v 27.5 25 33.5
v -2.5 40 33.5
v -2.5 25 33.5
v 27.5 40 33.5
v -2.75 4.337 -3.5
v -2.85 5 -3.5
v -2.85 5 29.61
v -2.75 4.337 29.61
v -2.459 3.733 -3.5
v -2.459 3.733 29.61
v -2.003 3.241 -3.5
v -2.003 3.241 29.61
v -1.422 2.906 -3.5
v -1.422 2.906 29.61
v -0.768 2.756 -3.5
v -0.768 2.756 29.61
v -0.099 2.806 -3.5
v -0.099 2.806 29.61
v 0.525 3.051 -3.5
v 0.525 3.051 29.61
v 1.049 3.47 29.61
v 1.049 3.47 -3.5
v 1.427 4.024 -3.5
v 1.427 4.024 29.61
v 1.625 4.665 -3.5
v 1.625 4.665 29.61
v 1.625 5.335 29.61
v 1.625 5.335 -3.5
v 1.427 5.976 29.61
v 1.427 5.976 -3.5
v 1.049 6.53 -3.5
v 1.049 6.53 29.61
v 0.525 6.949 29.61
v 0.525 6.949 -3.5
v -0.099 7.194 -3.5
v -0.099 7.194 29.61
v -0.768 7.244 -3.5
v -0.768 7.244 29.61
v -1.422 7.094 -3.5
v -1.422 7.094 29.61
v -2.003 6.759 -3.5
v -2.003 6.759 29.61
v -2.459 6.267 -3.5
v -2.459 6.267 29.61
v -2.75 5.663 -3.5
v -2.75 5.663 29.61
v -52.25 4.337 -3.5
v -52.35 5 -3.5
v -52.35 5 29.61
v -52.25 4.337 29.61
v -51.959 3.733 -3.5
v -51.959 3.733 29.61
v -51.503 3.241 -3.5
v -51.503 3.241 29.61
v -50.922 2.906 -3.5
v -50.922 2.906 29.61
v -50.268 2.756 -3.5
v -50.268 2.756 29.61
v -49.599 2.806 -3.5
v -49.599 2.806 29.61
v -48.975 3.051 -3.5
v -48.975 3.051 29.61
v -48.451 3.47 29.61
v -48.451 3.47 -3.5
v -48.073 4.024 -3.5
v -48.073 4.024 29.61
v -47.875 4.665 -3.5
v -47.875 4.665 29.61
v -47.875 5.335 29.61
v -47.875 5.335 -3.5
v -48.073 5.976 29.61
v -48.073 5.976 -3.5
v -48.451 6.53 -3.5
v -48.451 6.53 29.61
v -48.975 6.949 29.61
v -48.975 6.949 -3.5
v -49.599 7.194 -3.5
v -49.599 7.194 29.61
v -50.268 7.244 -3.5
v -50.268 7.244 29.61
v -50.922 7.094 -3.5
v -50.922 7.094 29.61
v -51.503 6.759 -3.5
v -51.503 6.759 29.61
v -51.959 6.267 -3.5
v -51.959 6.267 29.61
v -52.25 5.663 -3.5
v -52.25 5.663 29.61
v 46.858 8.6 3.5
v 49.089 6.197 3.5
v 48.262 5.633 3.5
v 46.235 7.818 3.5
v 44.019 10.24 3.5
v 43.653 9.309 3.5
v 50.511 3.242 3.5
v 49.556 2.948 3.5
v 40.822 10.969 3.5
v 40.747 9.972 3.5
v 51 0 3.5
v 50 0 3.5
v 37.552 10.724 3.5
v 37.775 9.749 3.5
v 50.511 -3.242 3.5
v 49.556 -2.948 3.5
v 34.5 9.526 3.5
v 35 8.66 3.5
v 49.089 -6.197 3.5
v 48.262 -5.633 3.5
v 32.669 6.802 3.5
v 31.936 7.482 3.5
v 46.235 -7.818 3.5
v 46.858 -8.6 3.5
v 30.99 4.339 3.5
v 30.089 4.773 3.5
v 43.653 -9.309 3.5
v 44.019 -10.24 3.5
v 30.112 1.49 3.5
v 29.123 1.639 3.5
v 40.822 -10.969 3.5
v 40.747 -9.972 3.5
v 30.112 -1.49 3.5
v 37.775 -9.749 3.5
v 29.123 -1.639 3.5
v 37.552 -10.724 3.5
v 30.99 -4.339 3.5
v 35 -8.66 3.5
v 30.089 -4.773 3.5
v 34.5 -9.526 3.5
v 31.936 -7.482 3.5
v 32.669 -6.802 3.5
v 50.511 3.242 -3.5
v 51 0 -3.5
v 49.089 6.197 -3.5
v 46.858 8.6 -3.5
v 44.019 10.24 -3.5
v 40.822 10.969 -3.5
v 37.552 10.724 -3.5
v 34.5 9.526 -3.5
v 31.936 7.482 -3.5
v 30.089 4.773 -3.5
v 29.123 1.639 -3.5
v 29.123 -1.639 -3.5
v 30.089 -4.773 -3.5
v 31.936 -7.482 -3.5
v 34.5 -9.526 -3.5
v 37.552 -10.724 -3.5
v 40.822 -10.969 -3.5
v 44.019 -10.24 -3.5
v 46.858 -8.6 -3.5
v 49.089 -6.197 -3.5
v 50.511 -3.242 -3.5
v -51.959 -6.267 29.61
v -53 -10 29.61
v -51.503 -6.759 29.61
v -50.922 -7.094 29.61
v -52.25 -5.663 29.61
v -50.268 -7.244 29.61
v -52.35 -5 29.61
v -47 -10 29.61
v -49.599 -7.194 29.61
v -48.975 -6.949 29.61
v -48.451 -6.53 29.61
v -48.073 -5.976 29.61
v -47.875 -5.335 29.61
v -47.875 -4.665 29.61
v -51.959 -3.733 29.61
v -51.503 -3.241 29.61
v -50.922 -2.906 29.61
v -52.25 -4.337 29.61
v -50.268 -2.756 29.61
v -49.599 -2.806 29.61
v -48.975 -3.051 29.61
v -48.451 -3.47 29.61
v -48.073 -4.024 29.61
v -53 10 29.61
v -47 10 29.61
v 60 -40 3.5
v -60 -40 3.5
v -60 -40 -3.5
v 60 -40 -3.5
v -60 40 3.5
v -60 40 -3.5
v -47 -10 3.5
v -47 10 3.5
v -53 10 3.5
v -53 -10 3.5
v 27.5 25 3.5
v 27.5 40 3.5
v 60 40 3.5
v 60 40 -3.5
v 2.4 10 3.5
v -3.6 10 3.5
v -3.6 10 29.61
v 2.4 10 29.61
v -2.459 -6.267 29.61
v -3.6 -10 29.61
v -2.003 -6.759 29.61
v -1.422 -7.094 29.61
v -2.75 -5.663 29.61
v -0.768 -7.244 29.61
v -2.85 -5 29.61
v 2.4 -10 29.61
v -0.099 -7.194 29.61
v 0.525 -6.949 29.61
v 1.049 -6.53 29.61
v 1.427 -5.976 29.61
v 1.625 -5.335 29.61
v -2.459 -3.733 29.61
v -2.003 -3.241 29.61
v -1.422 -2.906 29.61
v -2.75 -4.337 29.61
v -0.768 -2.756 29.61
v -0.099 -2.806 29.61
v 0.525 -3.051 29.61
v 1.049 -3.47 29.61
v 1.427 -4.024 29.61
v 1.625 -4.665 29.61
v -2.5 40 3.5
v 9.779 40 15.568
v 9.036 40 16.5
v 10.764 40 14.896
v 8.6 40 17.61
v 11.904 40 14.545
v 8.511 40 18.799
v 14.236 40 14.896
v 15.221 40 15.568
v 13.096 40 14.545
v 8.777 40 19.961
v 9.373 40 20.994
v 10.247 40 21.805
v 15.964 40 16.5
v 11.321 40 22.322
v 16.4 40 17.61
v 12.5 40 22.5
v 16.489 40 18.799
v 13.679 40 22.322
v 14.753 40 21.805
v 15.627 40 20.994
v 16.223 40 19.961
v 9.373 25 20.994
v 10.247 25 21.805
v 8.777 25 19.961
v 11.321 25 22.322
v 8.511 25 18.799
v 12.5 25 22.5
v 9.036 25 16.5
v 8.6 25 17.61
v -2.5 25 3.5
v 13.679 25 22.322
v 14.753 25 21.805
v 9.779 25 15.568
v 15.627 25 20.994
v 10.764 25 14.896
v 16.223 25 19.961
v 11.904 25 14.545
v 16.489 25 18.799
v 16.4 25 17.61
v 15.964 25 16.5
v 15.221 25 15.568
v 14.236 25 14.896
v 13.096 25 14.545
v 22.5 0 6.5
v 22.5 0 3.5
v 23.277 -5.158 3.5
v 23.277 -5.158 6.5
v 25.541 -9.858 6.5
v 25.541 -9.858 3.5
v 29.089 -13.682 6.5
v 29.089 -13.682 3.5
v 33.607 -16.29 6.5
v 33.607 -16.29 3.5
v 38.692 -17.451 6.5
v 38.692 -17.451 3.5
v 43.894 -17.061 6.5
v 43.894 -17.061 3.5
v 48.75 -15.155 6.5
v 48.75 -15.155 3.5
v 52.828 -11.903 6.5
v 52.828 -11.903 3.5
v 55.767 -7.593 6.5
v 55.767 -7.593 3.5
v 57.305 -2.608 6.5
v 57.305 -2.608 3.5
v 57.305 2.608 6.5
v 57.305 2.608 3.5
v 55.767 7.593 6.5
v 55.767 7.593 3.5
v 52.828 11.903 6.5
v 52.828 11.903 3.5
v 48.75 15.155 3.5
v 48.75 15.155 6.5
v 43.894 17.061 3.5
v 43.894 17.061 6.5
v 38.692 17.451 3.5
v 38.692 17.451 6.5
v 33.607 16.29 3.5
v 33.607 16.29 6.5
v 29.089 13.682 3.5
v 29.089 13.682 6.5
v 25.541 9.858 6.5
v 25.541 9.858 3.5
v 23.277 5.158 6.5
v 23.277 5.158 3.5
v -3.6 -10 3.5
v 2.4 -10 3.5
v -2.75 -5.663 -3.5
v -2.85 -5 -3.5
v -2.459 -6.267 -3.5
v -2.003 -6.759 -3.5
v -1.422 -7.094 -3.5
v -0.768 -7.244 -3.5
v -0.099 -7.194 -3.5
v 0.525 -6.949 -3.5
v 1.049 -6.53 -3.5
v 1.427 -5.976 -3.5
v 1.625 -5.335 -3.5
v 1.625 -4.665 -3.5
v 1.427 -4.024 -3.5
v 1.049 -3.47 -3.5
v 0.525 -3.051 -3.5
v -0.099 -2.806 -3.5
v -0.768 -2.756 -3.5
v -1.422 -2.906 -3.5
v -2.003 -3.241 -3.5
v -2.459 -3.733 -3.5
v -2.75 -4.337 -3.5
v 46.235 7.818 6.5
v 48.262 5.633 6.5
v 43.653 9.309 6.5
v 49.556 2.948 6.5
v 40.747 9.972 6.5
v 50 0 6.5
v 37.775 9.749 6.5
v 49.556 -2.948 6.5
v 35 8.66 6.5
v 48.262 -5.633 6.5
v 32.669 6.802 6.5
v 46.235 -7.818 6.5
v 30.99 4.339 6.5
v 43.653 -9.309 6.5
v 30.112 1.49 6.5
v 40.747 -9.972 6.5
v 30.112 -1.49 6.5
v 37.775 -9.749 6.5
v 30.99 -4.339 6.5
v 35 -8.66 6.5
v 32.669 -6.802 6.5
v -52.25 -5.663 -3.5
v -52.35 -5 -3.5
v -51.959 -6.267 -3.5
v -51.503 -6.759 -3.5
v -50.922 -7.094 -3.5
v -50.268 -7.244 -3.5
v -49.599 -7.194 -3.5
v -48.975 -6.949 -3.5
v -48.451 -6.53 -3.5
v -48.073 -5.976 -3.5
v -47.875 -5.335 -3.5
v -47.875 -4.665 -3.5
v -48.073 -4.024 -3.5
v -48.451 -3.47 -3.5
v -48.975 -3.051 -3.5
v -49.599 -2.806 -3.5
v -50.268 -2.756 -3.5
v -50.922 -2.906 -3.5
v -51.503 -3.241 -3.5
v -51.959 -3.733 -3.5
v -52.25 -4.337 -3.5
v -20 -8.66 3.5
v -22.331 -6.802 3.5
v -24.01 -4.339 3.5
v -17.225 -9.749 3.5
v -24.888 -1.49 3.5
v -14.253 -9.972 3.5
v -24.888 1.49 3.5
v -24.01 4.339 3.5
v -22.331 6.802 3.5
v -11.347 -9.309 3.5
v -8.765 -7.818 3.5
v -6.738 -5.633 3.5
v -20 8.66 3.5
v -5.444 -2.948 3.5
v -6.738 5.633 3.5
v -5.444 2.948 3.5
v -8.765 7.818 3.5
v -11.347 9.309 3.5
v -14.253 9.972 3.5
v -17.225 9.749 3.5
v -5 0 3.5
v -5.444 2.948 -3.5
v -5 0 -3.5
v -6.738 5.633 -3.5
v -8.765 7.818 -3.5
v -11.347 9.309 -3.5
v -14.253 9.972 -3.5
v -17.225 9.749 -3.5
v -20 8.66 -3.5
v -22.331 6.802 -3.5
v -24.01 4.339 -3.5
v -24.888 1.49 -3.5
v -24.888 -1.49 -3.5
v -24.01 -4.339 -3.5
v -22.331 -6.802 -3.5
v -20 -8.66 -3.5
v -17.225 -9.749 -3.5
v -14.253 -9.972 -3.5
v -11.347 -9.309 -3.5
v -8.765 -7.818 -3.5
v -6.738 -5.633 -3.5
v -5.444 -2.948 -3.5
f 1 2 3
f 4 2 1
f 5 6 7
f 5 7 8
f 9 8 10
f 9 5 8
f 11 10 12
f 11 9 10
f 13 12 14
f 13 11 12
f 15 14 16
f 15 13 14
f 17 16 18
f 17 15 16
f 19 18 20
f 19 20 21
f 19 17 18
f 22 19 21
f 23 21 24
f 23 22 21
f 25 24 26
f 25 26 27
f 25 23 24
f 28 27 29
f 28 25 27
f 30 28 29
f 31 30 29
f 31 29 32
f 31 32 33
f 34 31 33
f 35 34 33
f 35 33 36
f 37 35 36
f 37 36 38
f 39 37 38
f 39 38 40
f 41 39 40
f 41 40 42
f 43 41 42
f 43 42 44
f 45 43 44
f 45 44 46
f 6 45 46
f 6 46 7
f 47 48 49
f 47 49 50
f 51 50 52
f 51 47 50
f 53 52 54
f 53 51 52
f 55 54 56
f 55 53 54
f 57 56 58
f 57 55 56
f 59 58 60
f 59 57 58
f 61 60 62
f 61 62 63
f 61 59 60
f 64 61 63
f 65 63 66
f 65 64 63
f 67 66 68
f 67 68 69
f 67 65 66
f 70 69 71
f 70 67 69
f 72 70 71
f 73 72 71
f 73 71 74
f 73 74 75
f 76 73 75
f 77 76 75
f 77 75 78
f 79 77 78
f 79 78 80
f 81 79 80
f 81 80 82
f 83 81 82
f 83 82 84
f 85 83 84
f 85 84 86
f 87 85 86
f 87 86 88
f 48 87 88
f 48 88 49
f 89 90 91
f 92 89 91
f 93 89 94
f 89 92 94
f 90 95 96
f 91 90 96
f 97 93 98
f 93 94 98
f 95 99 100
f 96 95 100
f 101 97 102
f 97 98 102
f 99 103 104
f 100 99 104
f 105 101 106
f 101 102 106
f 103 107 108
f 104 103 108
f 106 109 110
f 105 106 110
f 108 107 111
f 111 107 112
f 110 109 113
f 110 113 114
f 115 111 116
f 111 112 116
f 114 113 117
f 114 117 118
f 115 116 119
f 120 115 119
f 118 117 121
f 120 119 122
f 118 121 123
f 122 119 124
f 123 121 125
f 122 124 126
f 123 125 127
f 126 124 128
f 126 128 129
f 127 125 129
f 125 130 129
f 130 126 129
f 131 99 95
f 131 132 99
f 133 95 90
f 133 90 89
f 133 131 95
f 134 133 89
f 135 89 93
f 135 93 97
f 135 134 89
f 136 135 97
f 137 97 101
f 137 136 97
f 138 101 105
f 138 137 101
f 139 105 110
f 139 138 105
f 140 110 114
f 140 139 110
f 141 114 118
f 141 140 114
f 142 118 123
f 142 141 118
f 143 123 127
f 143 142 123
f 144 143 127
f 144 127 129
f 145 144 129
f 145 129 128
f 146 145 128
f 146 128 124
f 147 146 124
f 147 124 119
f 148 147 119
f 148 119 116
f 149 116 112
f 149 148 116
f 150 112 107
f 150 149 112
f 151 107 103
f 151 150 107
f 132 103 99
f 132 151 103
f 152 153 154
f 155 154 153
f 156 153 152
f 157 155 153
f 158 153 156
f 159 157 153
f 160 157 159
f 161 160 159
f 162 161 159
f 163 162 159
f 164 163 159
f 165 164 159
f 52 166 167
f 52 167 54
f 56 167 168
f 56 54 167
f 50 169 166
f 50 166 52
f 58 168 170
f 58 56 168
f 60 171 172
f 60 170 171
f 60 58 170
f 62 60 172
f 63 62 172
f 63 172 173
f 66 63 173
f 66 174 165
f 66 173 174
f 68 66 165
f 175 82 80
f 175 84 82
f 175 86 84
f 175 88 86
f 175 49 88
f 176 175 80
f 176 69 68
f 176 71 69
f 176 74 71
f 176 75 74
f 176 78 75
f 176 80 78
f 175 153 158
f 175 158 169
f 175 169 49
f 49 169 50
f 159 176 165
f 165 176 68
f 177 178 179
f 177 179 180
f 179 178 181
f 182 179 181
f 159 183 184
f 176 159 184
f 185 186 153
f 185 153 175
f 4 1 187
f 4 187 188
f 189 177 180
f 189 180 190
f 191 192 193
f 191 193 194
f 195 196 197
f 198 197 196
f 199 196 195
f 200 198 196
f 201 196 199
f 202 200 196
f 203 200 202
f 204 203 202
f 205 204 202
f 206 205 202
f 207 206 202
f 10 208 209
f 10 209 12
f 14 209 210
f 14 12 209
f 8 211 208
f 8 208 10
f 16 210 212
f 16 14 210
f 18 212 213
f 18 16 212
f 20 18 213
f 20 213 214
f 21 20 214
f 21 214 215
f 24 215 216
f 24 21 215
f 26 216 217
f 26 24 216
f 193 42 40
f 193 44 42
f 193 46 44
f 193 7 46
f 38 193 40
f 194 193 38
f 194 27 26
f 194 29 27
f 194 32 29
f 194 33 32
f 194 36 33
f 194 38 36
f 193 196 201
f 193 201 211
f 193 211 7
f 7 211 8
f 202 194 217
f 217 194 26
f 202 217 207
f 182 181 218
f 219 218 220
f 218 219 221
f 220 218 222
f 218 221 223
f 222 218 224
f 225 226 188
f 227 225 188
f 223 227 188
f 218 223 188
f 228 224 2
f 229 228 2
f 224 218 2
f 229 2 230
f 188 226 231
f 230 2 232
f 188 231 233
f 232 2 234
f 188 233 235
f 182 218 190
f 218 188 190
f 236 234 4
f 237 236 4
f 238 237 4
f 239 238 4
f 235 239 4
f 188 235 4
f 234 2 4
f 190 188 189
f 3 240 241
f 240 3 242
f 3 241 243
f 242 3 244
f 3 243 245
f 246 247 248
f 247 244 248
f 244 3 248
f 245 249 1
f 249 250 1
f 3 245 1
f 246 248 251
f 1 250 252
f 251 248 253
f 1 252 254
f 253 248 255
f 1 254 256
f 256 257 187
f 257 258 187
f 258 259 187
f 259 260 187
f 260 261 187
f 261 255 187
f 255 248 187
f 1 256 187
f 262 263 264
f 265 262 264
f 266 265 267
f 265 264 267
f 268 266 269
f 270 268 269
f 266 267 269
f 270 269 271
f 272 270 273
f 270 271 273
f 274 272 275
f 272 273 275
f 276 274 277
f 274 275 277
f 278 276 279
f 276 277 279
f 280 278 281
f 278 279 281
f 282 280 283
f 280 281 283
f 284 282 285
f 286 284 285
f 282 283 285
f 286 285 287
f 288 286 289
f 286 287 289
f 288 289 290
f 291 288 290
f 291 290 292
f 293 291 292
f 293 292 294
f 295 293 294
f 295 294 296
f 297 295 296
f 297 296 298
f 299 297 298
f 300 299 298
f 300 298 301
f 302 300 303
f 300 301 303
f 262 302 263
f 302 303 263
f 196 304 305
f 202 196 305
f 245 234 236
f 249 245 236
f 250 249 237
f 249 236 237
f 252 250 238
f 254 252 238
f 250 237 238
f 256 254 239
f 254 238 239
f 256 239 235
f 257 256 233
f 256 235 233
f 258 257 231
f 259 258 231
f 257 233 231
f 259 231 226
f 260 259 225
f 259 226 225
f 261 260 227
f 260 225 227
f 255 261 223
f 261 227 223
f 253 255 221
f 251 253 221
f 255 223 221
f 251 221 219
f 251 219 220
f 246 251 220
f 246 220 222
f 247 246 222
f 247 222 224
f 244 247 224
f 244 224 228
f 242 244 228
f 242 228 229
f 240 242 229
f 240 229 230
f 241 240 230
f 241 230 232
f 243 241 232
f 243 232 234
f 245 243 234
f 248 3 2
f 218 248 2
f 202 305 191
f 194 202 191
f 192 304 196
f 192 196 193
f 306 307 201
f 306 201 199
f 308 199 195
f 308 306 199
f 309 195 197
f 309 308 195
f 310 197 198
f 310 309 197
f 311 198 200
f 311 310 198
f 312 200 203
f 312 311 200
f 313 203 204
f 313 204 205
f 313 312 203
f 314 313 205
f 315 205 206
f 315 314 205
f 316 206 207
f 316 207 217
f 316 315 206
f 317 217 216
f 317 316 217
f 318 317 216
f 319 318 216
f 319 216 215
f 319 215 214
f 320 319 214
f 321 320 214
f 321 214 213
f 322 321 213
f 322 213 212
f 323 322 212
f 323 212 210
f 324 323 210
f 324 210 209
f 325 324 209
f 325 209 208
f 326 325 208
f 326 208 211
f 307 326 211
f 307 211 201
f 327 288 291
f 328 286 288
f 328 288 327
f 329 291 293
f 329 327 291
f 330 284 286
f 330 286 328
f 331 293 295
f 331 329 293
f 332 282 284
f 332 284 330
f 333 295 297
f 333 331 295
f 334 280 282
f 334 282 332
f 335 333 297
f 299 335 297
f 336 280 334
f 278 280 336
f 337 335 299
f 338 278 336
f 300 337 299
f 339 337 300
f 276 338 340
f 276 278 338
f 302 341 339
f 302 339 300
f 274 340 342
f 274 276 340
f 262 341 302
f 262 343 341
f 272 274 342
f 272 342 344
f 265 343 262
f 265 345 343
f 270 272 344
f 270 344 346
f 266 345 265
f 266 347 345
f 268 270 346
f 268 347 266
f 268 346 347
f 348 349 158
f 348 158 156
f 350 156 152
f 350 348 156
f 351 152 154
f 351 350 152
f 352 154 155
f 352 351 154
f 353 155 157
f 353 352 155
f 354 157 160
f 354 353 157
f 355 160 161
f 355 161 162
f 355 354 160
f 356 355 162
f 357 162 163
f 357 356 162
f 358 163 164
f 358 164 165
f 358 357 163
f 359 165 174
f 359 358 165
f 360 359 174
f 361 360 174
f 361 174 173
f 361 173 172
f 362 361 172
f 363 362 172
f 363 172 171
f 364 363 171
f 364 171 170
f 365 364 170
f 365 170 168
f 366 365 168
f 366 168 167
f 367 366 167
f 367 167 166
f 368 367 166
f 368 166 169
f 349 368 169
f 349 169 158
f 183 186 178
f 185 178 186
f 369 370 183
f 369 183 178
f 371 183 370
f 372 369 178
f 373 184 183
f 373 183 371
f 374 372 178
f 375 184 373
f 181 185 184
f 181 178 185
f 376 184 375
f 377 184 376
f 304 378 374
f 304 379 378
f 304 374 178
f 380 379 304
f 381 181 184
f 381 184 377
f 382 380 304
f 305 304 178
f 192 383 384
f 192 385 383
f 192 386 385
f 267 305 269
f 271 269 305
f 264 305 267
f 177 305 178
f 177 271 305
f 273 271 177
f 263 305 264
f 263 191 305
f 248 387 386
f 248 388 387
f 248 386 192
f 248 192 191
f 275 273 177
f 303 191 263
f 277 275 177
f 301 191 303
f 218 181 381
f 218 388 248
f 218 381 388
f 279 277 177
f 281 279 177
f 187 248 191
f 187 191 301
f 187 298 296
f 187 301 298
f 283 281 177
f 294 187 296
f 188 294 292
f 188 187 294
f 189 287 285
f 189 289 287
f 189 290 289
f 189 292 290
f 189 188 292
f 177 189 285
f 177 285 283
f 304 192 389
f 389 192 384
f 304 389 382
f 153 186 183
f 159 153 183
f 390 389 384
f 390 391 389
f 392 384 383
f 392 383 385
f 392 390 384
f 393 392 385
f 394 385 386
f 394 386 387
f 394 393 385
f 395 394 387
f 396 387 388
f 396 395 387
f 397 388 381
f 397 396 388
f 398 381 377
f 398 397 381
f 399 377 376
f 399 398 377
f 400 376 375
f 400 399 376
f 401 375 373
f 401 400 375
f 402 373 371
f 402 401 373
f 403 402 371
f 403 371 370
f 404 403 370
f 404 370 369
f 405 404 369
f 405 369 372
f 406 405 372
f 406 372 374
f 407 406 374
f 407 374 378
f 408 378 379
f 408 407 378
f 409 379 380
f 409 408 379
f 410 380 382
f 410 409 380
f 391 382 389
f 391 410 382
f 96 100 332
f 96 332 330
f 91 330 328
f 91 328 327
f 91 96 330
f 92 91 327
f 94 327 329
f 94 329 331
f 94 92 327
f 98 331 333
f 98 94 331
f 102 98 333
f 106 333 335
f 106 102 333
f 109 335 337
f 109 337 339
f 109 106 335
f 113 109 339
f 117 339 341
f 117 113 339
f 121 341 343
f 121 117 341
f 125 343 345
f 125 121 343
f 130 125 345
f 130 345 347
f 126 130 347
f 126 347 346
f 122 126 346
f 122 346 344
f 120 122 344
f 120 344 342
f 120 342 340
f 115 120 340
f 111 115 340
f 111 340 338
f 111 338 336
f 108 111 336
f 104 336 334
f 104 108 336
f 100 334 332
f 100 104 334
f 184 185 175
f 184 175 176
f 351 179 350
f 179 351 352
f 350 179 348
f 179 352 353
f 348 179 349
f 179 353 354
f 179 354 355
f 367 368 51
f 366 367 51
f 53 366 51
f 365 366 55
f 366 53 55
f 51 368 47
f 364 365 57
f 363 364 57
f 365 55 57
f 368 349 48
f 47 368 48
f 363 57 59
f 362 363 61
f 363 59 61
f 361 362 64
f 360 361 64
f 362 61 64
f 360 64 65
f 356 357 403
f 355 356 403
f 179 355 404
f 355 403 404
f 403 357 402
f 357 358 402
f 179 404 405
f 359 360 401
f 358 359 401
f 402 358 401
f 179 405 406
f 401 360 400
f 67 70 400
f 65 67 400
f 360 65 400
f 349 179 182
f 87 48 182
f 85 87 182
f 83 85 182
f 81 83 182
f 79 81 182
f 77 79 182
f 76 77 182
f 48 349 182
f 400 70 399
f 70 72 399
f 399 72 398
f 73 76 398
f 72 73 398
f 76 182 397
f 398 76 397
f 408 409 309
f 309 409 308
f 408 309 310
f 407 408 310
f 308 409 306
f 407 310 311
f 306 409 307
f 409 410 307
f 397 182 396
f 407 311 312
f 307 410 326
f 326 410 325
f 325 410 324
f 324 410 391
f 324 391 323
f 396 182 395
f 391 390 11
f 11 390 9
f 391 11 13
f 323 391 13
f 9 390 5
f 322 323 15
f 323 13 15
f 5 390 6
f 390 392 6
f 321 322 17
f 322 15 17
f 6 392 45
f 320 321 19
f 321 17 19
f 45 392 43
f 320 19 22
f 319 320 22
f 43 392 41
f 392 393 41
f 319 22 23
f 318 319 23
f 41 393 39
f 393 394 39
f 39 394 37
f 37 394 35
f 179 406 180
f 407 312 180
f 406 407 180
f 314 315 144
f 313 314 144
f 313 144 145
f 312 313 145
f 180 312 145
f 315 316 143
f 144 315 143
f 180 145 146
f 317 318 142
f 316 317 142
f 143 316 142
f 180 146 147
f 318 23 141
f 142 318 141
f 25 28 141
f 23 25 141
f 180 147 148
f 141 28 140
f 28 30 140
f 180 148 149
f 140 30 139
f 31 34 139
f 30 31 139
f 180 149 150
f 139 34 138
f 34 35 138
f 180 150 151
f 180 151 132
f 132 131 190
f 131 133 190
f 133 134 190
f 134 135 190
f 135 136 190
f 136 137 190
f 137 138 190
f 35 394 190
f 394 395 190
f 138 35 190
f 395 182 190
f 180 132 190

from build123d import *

# Parameters (mm, degrees)
SKETCH1_W           = 120
SKETCH1_H           = 80
SKETCH1_R           = 10
SKETCH1_R_2         = 11
BOSS_EXTRUDE1_DEPTH = 3.5
SKETCH2_R           = 17.5
SKETCH2_R_2         = 10
BOSS_EXTRUDE2_DEPTH = 3
SKETCH3_W           = 6
SKETCH3_H           = 20
SKETCH3_R           = 2.25
BOSS_EXTRUDE3_DEPTH = 26.11
CUT_EXTRUDE1_START  = -26.11
SKETCH4_R           = 2.25
CUT_EXTRUDE1_DEPTH  = 26.11
SKETCH5_W           = 30
SKETCH5_H           = 15
BOSS_EXTRUDE4_DEPTH = 30
SKETCH6_R           = 4
CUT_EXTRUDE2_DEPTH  = 29


with BuildPart() as part:
    # Sketch1 → Boss-Extrude1 (new, symmetric)
    with BuildSketch(Plane.XY):
        Rectangle(SKETCH1_W, SKETCH1_H)
        with Locations((-15, 0)):
            Circle(SKETCH1_R, mode=Mode.SUBTRACT)
        with Locations((40, 0)):
            Circle(SKETCH1_R_2, mode=Mode.SUBTRACT)
    extrude(amount=BOSS_EXTRUDE1_DEPTH, both=True)

    # Sketch2 → Boss-Extrude2 (add)
    with BuildSketch(Plane.XY.offset(3.5)):
        with Locations(Location((40, 0, 0), (0, 0, 180))):
            Circle(SKETCH2_R)
        with Locations((40, 0)):
            Circle(SKETCH2_R_2, mode=Mode.SUBTRACT)
    extrude(amount=BOSS_EXTRUDE2_DEPTH)

    # Sketch3 → Boss-Extrude3 (add)
    # profile 1 of 2: a face of its own
    with BuildSketch(Plane.XY.offset(3.5)):
        with Locations((-50, 0)):
            Rectangle(SKETCH3_W, SKETCH3_H)
        with Locations(Location((-50.1, -5, 0), (0, 0, 180))):
            Circle(SKETCH3_R, mode=Mode.SUBTRACT)
        with Locations(Location((-50.1, 5, 0), (0, 0, 180))):
            Circle(SKETCH3_R, mode=Mode.SUBTRACT)
    # profile 2 of 2: a face of its own
    with BuildSketch(Plane.XY.offset(3.5)):
        with Locations((-0.6, 0)):
            Rectangle(SKETCH3_W, SKETCH3_H)
        with Locations(Location((-0.6, -5, 0), (0, 0, 180))):
            Circle(SKETCH3_R, mode=Mode.SUBTRACT)
        with Locations(Location((-0.6, 5, 0), (0, 0, 180))):
            Circle(SKETCH3_R, mode=Mode.SUBTRACT)
    extrude(amount=BOSS_EXTRUDE3_DEPTH)

    # Sketch4 → Cut-Extrude1 (cut)
    with BuildSketch(Plane.XY.offset(3.5).offset(CUT_EXTRUDE1_START)):
        with Locations(Location((-50.1, 5, 0), (0, 0, 180))):
            Circle(SKETCH4_R)
        with Locations(Location((-50.1, -5, 0), (0, 0, 180))):
            Circle(SKETCH4_R)
        with Locations(Location((-0.6, 5, 0), (0, 0, 180))):
            Circle(SKETCH4_R)
        with Locations(Location((-0.6, -5, 0), (0, 0, 180))):
            Circle(SKETCH4_R)
    extrude(amount=CUT_EXTRUDE1_DEPTH, mode=Mode.SUBTRACT)

    # Sketch5 → Boss-Extrude4 (add)
    with BuildSketch(Plane.XY.offset(3.5)):
        with Locations((12.5, 32.5)):
            Rectangle(SKETCH5_W, SKETCH5_H)
    extrude(amount=BOSS_EXTRUDE4_DEPTH)

    # Sketch6 → Cut-Extrude2 (cut)
    with BuildSketch(Plane(origin=(0, 40, 0), x_dir=(1, 0, 0), z_dir=(0, 1, 0))):
        with Locations(Location((12.5, -18.5, 0), (0, 0, 270))):
            Circle(SKETCH6_R)
    extrude(amount=-CUT_EXTRUDE2_DEPTH, mode=Mode.SUBTRACT)


solid = part.part
